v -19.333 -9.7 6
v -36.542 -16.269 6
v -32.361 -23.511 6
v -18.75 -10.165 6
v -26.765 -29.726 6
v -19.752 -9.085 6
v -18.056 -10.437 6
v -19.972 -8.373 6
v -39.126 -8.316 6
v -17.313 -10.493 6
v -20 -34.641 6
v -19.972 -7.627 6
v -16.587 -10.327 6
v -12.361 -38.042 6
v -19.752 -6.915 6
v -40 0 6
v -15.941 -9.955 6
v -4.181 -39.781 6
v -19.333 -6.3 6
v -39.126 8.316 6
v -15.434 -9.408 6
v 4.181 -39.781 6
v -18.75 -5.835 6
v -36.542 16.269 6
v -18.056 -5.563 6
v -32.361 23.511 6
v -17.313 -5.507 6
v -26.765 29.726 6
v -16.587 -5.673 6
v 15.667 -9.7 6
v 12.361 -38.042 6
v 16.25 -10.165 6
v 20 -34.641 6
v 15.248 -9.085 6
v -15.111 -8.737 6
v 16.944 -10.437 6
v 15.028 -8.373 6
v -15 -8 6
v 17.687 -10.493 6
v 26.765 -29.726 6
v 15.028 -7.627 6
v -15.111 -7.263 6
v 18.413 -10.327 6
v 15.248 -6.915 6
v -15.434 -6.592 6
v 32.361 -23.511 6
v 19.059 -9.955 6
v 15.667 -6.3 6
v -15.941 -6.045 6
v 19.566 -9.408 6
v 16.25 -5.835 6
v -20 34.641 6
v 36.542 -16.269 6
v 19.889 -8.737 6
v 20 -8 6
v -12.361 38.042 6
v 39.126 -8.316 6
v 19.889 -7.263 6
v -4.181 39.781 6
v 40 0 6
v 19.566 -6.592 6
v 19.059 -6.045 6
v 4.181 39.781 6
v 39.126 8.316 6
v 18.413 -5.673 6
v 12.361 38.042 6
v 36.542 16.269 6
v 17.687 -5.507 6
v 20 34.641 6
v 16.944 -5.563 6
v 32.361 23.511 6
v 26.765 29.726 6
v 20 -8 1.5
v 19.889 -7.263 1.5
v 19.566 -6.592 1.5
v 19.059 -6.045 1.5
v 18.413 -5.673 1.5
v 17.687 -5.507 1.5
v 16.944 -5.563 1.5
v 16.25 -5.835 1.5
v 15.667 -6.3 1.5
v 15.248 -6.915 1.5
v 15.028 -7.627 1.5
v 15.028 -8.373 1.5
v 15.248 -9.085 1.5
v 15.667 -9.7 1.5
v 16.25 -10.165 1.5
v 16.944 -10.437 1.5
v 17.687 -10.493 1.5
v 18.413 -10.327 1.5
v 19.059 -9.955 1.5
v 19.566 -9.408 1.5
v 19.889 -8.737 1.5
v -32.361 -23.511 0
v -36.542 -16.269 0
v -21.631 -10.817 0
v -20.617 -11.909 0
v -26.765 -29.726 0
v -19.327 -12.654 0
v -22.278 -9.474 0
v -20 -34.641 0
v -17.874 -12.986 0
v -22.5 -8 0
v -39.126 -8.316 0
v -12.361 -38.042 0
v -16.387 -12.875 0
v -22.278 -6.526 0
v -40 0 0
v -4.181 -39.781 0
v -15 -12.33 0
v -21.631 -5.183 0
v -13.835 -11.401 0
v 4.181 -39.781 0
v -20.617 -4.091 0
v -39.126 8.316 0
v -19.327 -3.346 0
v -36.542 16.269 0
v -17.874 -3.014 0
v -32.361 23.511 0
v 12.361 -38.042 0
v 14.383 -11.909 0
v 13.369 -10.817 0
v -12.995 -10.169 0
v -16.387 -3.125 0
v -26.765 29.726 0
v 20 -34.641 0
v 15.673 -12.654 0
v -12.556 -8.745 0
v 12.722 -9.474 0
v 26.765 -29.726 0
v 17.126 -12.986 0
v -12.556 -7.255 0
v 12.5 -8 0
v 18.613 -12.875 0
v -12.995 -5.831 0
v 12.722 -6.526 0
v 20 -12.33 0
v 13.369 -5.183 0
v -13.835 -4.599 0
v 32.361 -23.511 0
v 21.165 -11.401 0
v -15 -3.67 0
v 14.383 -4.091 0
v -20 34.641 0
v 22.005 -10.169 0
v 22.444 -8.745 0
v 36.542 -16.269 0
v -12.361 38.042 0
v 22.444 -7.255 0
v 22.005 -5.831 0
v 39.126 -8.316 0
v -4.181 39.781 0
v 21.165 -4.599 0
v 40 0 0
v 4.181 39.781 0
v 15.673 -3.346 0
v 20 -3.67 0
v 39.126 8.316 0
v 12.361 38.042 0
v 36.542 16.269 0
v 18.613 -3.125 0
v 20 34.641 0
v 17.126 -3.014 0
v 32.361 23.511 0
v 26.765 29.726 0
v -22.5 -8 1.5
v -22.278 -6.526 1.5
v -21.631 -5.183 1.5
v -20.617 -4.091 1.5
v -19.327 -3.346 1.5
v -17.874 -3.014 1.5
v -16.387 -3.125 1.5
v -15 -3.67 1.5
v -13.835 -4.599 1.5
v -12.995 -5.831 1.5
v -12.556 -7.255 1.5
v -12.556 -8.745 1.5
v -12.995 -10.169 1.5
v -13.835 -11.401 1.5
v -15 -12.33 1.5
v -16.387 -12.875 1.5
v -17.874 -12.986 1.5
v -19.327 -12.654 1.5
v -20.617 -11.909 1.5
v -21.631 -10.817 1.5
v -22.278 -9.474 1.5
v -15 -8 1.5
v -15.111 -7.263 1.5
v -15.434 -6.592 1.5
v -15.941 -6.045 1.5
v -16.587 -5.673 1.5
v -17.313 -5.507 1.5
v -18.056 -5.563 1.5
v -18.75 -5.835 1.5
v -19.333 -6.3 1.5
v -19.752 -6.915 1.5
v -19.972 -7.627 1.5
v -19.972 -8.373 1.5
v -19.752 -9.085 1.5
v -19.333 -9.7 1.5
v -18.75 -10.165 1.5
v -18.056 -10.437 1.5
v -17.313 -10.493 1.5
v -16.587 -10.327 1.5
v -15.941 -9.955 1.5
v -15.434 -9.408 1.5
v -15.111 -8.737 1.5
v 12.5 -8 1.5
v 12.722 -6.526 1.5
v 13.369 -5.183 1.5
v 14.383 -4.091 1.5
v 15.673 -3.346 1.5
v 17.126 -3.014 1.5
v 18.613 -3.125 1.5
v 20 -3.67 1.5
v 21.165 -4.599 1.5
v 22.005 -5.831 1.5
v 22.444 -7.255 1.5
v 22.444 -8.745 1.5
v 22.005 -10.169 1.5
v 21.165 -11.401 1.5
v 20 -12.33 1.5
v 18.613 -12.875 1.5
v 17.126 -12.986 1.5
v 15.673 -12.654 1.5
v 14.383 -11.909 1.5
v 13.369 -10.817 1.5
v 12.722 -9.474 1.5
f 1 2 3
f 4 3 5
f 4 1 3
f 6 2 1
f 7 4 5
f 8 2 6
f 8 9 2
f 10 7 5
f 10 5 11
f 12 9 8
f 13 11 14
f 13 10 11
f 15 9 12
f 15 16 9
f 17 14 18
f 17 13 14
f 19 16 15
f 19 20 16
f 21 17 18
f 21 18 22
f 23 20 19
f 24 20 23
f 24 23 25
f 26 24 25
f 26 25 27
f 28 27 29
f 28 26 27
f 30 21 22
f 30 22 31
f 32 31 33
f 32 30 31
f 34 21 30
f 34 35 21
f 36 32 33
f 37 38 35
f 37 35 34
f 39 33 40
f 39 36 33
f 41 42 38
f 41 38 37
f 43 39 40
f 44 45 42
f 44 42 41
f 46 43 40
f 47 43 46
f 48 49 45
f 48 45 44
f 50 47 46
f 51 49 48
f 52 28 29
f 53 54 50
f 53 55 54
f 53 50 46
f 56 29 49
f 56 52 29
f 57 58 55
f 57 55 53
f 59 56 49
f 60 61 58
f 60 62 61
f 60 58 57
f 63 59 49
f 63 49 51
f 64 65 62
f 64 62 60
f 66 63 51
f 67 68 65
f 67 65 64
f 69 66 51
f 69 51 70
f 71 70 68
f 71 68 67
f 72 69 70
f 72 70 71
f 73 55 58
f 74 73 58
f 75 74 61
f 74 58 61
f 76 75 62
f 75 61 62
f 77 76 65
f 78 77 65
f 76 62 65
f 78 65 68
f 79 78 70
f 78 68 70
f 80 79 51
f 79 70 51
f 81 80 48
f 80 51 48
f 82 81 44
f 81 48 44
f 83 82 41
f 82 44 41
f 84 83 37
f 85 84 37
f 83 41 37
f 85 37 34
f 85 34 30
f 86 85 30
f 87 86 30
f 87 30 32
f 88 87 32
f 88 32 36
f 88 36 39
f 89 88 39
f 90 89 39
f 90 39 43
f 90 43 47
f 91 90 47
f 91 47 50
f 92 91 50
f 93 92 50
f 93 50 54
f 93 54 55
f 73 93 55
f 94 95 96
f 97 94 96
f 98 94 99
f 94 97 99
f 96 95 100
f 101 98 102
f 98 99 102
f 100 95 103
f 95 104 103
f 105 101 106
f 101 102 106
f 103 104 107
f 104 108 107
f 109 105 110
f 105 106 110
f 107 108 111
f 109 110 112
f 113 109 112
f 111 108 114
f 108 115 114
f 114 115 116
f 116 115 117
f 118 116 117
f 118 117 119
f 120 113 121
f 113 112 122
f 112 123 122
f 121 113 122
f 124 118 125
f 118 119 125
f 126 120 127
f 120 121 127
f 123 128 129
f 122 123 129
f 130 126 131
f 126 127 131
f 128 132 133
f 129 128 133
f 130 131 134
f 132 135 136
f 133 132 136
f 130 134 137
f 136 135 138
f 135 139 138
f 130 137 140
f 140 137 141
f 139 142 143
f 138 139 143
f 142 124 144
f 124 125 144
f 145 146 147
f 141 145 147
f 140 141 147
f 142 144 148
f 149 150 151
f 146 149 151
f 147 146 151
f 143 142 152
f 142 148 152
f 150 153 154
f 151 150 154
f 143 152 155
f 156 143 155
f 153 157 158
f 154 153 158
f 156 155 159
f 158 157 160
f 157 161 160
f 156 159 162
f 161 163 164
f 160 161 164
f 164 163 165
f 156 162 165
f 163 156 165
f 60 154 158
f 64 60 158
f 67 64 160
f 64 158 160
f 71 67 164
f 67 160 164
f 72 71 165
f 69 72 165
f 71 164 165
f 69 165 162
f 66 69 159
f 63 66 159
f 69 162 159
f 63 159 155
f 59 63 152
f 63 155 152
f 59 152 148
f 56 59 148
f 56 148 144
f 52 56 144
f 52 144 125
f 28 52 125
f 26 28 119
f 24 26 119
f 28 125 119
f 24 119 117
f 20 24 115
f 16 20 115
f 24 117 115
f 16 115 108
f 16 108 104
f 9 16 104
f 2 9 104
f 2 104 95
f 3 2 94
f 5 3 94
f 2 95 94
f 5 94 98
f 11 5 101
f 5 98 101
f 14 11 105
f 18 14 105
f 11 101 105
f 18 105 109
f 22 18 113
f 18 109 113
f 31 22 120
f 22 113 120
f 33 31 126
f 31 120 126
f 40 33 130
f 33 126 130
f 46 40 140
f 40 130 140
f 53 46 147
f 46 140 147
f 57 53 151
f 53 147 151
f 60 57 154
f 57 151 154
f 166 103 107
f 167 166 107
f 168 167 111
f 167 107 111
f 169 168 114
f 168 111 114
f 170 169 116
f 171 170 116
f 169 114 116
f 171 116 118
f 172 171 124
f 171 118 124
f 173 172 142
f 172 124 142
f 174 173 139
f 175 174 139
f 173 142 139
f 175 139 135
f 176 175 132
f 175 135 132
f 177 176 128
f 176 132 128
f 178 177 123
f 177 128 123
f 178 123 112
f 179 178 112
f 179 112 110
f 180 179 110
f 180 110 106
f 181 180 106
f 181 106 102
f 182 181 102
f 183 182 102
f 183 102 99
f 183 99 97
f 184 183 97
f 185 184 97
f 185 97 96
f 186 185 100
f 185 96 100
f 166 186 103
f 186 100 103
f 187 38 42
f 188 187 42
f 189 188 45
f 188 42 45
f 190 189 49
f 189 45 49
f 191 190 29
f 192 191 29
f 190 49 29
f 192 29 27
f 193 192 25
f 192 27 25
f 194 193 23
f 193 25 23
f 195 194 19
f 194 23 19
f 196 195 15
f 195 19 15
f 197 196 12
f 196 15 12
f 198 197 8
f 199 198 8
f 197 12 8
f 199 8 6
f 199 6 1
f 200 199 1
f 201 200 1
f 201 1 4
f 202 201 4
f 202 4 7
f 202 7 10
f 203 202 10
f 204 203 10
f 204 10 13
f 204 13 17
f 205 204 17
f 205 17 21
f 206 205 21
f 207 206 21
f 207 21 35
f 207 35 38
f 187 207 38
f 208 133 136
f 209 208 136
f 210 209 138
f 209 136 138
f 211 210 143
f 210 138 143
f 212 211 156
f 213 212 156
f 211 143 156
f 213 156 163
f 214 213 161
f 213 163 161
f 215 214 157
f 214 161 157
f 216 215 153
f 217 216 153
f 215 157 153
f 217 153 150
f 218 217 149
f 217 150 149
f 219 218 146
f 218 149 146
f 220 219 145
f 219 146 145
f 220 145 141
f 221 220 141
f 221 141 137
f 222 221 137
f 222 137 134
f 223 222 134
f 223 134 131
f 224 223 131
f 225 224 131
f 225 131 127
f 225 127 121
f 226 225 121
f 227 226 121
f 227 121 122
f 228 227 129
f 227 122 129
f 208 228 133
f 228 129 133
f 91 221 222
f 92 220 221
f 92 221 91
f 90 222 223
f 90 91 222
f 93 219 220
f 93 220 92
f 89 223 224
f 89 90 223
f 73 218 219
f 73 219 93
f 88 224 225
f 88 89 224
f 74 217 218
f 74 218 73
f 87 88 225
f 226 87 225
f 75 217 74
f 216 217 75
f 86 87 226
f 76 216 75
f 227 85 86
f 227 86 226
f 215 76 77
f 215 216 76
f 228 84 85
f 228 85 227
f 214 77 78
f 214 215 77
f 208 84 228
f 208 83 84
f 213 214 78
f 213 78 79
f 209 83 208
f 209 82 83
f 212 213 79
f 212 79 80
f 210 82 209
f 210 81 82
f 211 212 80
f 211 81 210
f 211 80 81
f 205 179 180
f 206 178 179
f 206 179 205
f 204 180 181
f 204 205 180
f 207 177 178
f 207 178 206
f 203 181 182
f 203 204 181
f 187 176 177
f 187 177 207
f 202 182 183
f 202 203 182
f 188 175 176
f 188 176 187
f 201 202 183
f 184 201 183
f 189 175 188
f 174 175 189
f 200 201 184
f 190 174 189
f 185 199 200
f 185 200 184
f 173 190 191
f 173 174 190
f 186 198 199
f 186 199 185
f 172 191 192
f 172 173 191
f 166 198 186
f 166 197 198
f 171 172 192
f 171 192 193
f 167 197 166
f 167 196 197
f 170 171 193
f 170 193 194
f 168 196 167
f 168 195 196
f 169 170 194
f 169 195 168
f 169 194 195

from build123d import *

# Parameters (mm, degrees)
SKETCH3_R           = 40
BOSS_EXTRUDE1_DEPTH = 6
SKETCH4_R           = 2.1
CUT_EXTRUDE1_DEPTH  = 57.885850613
SKETCH5_R           = 5
CUT_EXTRUDE2_DEPTH  = 1.5
MOVE_FACE1_BY       = 0.4
MOVE_FACE1_2_BY     = 0.4


with BuildPart() as part:
    # Sketch3 → Boss-Extrude1 (new body)
    with BuildSketch(Plane.XY):
        Circle(SKETCH3_R)
    extrude(amount=BOSS_EXTRUDE1_DEPTH)

    # Sketch4 → Cut-Extrude1 (cut, through all)
    with BuildSketch(Plane.XY.offset(6)):
        with Locations((-17.5, -8)):
            Circle(SKETCH4_R)
        with Locations((17.5, -8)):
            Circle(SKETCH4_R)
    extrude(amount=-CUT_EXTRUDE1_DEPTH, mode=Mode.SUBTRACT)

    # Sketch5 → Cut-Extrude2 (cut)
    with BuildSketch(Plane(origin=(0, 0, 0), x_dir=(-1, 0, 0), z_dir=(0, 0, -1))):
        with Locations((-17.5, -8)):
            Circle(SKETCH5_R)
        with Locations((17.5, -8)):
            Circle(SKETCH5_R)
    extrude(amount=-CUT_EXTRUDE2_DEPTH, mode=Mode.SUBTRACT)

    # Move Face1: a curved face moved inward by 0.4
    add(Solid.thicken(part.faces().sort_by_distance((-19.6, -8, 3.75))[0], -MOVE_FACE1_BY), mode=Mode.SUBTRACT)

    # Move Face1 2: a curved face moved inward by 0.4
    add(Solid.thicken(part.faces().sort_by_distance((15.4, -8, 3.75))[0], -MOVE_FACE1_2_BY), mode=Mode.SUBTRACT)


solid = part.part
